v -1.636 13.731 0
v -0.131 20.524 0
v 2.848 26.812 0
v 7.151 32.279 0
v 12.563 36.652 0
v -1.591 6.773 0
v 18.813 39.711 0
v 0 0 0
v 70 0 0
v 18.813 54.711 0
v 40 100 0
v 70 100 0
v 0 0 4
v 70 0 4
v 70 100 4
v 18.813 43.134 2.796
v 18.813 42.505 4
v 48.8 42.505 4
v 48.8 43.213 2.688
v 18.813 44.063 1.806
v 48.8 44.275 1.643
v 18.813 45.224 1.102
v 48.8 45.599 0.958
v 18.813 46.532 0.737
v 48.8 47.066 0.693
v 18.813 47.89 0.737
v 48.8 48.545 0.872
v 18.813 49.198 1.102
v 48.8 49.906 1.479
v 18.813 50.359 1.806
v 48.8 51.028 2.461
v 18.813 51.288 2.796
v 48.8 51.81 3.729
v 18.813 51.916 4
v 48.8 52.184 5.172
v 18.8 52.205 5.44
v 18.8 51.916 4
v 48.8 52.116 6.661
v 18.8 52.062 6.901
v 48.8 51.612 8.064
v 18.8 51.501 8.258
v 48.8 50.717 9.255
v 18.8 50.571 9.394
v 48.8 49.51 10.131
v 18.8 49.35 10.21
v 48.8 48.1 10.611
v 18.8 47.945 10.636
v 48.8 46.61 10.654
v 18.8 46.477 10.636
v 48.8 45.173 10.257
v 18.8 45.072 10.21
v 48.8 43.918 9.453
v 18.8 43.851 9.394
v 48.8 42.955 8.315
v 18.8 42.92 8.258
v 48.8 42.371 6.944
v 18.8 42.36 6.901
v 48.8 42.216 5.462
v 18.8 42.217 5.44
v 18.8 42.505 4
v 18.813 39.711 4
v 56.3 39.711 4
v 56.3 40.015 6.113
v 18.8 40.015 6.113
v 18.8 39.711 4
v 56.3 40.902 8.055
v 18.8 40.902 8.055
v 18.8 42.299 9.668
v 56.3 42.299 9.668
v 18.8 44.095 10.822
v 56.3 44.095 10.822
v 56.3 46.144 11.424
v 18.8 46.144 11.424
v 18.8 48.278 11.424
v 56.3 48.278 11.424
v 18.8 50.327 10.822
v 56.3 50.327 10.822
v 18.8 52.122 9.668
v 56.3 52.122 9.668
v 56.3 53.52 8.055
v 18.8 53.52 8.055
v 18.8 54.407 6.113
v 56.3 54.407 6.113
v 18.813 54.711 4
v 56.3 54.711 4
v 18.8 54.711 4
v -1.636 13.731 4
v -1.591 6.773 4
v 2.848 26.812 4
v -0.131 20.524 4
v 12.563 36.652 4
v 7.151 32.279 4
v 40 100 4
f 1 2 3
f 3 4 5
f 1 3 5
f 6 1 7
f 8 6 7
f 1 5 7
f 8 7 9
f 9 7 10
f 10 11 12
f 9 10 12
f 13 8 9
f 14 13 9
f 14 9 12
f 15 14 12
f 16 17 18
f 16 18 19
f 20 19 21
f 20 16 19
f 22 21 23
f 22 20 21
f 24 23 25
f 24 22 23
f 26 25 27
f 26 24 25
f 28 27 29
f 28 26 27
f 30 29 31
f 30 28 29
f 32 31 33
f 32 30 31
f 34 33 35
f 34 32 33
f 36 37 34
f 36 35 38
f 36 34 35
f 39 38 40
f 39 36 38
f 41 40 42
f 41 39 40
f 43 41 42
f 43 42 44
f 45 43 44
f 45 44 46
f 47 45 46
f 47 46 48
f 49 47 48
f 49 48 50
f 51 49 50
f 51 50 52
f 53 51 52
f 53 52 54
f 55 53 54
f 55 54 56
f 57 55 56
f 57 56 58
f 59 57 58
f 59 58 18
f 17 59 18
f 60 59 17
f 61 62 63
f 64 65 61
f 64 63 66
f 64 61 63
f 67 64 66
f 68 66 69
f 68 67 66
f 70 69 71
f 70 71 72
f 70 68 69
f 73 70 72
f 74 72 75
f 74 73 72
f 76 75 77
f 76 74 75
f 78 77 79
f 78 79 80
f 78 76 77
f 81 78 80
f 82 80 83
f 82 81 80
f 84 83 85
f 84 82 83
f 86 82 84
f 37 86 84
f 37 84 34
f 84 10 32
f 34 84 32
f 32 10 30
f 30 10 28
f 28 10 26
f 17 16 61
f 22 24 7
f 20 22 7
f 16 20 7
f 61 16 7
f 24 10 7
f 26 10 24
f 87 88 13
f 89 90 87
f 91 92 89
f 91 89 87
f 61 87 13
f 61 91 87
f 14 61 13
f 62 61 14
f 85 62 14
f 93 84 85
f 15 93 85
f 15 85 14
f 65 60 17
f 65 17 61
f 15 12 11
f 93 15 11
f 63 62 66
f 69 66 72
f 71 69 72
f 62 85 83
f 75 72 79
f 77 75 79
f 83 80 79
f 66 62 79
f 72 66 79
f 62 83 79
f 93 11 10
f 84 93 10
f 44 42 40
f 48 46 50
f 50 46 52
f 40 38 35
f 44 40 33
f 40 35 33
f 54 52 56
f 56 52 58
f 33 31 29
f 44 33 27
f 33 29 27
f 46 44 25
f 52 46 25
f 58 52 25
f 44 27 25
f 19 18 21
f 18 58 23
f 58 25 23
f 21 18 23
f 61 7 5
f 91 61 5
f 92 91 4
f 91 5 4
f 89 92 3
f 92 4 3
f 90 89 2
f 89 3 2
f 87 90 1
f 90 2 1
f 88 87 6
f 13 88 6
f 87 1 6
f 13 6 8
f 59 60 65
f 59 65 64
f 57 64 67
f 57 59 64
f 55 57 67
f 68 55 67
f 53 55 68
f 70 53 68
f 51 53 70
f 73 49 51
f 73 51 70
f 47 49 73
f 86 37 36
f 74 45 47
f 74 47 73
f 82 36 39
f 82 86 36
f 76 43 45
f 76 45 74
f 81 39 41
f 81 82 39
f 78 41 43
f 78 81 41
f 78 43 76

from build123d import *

# Parameters (mm, degrees)
BOSS_EXTRUDE1_DEPTH = 4
BOSS_EXTRUDE2_DEPTH = 37.5
SKETCH7_R           = 5
CUT_EXTRUDE1_DEPTH  = 30


with BuildPart() as part:
    # Sketch1 → Boss-Extrude1 (new body)
    with BuildSketch(Plane.XY):
        with BuildLine():
            Line((0, 0), (70, 0))
            Line((70, 0), (70, 100))
            Line((70, 100), (40, 100))
            Line((40, 100), (18.812777554, 54.710910751))
            Line((18.812777554, 54.710910751), (18.812777554, 39.710910751))
            ThreePointArc((18.812777554, 39.710910751), (1.181989874, 23.75170918), (0, 0))
        make_face()
    extrude(amount=BOSS_EXTRUDE1_DEPTH)

    # Sketch5 → Boss-Extrude2 (add)
    with BuildSketch(Plane(origin=(18.8, 0, 0), x_dir=(0, 0, -1), z_dir=(1, 0, 0))):
        with BuildLine():
            Line((-4, 54.710910751), (-4, 39.710910751))
            ThreePointArc((-4, 39.710910751), (-11.5, 47.210910751), (-4, 54.710910751))
        make_face()
    extrude(amount=BOSS_EXTRUDE2_DEPTH)

    # Sketch7 → Cut-Extrude1 (cut)
    with BuildSketch(Plane(origin=(18.8, 0, 0), x_dir=(0, 0, -1), z_dir=(1, 0, 0))):
        with Locations(Location((-5.690630422, 47.210910751, 0), (0, 0, 289.762746065))):
            Circle(SKETCH7_R)
    extrude(amount=CUT_EXTRUDE1_DEPTH, mode=Mode.SUBTRACT)


solid = part.part
